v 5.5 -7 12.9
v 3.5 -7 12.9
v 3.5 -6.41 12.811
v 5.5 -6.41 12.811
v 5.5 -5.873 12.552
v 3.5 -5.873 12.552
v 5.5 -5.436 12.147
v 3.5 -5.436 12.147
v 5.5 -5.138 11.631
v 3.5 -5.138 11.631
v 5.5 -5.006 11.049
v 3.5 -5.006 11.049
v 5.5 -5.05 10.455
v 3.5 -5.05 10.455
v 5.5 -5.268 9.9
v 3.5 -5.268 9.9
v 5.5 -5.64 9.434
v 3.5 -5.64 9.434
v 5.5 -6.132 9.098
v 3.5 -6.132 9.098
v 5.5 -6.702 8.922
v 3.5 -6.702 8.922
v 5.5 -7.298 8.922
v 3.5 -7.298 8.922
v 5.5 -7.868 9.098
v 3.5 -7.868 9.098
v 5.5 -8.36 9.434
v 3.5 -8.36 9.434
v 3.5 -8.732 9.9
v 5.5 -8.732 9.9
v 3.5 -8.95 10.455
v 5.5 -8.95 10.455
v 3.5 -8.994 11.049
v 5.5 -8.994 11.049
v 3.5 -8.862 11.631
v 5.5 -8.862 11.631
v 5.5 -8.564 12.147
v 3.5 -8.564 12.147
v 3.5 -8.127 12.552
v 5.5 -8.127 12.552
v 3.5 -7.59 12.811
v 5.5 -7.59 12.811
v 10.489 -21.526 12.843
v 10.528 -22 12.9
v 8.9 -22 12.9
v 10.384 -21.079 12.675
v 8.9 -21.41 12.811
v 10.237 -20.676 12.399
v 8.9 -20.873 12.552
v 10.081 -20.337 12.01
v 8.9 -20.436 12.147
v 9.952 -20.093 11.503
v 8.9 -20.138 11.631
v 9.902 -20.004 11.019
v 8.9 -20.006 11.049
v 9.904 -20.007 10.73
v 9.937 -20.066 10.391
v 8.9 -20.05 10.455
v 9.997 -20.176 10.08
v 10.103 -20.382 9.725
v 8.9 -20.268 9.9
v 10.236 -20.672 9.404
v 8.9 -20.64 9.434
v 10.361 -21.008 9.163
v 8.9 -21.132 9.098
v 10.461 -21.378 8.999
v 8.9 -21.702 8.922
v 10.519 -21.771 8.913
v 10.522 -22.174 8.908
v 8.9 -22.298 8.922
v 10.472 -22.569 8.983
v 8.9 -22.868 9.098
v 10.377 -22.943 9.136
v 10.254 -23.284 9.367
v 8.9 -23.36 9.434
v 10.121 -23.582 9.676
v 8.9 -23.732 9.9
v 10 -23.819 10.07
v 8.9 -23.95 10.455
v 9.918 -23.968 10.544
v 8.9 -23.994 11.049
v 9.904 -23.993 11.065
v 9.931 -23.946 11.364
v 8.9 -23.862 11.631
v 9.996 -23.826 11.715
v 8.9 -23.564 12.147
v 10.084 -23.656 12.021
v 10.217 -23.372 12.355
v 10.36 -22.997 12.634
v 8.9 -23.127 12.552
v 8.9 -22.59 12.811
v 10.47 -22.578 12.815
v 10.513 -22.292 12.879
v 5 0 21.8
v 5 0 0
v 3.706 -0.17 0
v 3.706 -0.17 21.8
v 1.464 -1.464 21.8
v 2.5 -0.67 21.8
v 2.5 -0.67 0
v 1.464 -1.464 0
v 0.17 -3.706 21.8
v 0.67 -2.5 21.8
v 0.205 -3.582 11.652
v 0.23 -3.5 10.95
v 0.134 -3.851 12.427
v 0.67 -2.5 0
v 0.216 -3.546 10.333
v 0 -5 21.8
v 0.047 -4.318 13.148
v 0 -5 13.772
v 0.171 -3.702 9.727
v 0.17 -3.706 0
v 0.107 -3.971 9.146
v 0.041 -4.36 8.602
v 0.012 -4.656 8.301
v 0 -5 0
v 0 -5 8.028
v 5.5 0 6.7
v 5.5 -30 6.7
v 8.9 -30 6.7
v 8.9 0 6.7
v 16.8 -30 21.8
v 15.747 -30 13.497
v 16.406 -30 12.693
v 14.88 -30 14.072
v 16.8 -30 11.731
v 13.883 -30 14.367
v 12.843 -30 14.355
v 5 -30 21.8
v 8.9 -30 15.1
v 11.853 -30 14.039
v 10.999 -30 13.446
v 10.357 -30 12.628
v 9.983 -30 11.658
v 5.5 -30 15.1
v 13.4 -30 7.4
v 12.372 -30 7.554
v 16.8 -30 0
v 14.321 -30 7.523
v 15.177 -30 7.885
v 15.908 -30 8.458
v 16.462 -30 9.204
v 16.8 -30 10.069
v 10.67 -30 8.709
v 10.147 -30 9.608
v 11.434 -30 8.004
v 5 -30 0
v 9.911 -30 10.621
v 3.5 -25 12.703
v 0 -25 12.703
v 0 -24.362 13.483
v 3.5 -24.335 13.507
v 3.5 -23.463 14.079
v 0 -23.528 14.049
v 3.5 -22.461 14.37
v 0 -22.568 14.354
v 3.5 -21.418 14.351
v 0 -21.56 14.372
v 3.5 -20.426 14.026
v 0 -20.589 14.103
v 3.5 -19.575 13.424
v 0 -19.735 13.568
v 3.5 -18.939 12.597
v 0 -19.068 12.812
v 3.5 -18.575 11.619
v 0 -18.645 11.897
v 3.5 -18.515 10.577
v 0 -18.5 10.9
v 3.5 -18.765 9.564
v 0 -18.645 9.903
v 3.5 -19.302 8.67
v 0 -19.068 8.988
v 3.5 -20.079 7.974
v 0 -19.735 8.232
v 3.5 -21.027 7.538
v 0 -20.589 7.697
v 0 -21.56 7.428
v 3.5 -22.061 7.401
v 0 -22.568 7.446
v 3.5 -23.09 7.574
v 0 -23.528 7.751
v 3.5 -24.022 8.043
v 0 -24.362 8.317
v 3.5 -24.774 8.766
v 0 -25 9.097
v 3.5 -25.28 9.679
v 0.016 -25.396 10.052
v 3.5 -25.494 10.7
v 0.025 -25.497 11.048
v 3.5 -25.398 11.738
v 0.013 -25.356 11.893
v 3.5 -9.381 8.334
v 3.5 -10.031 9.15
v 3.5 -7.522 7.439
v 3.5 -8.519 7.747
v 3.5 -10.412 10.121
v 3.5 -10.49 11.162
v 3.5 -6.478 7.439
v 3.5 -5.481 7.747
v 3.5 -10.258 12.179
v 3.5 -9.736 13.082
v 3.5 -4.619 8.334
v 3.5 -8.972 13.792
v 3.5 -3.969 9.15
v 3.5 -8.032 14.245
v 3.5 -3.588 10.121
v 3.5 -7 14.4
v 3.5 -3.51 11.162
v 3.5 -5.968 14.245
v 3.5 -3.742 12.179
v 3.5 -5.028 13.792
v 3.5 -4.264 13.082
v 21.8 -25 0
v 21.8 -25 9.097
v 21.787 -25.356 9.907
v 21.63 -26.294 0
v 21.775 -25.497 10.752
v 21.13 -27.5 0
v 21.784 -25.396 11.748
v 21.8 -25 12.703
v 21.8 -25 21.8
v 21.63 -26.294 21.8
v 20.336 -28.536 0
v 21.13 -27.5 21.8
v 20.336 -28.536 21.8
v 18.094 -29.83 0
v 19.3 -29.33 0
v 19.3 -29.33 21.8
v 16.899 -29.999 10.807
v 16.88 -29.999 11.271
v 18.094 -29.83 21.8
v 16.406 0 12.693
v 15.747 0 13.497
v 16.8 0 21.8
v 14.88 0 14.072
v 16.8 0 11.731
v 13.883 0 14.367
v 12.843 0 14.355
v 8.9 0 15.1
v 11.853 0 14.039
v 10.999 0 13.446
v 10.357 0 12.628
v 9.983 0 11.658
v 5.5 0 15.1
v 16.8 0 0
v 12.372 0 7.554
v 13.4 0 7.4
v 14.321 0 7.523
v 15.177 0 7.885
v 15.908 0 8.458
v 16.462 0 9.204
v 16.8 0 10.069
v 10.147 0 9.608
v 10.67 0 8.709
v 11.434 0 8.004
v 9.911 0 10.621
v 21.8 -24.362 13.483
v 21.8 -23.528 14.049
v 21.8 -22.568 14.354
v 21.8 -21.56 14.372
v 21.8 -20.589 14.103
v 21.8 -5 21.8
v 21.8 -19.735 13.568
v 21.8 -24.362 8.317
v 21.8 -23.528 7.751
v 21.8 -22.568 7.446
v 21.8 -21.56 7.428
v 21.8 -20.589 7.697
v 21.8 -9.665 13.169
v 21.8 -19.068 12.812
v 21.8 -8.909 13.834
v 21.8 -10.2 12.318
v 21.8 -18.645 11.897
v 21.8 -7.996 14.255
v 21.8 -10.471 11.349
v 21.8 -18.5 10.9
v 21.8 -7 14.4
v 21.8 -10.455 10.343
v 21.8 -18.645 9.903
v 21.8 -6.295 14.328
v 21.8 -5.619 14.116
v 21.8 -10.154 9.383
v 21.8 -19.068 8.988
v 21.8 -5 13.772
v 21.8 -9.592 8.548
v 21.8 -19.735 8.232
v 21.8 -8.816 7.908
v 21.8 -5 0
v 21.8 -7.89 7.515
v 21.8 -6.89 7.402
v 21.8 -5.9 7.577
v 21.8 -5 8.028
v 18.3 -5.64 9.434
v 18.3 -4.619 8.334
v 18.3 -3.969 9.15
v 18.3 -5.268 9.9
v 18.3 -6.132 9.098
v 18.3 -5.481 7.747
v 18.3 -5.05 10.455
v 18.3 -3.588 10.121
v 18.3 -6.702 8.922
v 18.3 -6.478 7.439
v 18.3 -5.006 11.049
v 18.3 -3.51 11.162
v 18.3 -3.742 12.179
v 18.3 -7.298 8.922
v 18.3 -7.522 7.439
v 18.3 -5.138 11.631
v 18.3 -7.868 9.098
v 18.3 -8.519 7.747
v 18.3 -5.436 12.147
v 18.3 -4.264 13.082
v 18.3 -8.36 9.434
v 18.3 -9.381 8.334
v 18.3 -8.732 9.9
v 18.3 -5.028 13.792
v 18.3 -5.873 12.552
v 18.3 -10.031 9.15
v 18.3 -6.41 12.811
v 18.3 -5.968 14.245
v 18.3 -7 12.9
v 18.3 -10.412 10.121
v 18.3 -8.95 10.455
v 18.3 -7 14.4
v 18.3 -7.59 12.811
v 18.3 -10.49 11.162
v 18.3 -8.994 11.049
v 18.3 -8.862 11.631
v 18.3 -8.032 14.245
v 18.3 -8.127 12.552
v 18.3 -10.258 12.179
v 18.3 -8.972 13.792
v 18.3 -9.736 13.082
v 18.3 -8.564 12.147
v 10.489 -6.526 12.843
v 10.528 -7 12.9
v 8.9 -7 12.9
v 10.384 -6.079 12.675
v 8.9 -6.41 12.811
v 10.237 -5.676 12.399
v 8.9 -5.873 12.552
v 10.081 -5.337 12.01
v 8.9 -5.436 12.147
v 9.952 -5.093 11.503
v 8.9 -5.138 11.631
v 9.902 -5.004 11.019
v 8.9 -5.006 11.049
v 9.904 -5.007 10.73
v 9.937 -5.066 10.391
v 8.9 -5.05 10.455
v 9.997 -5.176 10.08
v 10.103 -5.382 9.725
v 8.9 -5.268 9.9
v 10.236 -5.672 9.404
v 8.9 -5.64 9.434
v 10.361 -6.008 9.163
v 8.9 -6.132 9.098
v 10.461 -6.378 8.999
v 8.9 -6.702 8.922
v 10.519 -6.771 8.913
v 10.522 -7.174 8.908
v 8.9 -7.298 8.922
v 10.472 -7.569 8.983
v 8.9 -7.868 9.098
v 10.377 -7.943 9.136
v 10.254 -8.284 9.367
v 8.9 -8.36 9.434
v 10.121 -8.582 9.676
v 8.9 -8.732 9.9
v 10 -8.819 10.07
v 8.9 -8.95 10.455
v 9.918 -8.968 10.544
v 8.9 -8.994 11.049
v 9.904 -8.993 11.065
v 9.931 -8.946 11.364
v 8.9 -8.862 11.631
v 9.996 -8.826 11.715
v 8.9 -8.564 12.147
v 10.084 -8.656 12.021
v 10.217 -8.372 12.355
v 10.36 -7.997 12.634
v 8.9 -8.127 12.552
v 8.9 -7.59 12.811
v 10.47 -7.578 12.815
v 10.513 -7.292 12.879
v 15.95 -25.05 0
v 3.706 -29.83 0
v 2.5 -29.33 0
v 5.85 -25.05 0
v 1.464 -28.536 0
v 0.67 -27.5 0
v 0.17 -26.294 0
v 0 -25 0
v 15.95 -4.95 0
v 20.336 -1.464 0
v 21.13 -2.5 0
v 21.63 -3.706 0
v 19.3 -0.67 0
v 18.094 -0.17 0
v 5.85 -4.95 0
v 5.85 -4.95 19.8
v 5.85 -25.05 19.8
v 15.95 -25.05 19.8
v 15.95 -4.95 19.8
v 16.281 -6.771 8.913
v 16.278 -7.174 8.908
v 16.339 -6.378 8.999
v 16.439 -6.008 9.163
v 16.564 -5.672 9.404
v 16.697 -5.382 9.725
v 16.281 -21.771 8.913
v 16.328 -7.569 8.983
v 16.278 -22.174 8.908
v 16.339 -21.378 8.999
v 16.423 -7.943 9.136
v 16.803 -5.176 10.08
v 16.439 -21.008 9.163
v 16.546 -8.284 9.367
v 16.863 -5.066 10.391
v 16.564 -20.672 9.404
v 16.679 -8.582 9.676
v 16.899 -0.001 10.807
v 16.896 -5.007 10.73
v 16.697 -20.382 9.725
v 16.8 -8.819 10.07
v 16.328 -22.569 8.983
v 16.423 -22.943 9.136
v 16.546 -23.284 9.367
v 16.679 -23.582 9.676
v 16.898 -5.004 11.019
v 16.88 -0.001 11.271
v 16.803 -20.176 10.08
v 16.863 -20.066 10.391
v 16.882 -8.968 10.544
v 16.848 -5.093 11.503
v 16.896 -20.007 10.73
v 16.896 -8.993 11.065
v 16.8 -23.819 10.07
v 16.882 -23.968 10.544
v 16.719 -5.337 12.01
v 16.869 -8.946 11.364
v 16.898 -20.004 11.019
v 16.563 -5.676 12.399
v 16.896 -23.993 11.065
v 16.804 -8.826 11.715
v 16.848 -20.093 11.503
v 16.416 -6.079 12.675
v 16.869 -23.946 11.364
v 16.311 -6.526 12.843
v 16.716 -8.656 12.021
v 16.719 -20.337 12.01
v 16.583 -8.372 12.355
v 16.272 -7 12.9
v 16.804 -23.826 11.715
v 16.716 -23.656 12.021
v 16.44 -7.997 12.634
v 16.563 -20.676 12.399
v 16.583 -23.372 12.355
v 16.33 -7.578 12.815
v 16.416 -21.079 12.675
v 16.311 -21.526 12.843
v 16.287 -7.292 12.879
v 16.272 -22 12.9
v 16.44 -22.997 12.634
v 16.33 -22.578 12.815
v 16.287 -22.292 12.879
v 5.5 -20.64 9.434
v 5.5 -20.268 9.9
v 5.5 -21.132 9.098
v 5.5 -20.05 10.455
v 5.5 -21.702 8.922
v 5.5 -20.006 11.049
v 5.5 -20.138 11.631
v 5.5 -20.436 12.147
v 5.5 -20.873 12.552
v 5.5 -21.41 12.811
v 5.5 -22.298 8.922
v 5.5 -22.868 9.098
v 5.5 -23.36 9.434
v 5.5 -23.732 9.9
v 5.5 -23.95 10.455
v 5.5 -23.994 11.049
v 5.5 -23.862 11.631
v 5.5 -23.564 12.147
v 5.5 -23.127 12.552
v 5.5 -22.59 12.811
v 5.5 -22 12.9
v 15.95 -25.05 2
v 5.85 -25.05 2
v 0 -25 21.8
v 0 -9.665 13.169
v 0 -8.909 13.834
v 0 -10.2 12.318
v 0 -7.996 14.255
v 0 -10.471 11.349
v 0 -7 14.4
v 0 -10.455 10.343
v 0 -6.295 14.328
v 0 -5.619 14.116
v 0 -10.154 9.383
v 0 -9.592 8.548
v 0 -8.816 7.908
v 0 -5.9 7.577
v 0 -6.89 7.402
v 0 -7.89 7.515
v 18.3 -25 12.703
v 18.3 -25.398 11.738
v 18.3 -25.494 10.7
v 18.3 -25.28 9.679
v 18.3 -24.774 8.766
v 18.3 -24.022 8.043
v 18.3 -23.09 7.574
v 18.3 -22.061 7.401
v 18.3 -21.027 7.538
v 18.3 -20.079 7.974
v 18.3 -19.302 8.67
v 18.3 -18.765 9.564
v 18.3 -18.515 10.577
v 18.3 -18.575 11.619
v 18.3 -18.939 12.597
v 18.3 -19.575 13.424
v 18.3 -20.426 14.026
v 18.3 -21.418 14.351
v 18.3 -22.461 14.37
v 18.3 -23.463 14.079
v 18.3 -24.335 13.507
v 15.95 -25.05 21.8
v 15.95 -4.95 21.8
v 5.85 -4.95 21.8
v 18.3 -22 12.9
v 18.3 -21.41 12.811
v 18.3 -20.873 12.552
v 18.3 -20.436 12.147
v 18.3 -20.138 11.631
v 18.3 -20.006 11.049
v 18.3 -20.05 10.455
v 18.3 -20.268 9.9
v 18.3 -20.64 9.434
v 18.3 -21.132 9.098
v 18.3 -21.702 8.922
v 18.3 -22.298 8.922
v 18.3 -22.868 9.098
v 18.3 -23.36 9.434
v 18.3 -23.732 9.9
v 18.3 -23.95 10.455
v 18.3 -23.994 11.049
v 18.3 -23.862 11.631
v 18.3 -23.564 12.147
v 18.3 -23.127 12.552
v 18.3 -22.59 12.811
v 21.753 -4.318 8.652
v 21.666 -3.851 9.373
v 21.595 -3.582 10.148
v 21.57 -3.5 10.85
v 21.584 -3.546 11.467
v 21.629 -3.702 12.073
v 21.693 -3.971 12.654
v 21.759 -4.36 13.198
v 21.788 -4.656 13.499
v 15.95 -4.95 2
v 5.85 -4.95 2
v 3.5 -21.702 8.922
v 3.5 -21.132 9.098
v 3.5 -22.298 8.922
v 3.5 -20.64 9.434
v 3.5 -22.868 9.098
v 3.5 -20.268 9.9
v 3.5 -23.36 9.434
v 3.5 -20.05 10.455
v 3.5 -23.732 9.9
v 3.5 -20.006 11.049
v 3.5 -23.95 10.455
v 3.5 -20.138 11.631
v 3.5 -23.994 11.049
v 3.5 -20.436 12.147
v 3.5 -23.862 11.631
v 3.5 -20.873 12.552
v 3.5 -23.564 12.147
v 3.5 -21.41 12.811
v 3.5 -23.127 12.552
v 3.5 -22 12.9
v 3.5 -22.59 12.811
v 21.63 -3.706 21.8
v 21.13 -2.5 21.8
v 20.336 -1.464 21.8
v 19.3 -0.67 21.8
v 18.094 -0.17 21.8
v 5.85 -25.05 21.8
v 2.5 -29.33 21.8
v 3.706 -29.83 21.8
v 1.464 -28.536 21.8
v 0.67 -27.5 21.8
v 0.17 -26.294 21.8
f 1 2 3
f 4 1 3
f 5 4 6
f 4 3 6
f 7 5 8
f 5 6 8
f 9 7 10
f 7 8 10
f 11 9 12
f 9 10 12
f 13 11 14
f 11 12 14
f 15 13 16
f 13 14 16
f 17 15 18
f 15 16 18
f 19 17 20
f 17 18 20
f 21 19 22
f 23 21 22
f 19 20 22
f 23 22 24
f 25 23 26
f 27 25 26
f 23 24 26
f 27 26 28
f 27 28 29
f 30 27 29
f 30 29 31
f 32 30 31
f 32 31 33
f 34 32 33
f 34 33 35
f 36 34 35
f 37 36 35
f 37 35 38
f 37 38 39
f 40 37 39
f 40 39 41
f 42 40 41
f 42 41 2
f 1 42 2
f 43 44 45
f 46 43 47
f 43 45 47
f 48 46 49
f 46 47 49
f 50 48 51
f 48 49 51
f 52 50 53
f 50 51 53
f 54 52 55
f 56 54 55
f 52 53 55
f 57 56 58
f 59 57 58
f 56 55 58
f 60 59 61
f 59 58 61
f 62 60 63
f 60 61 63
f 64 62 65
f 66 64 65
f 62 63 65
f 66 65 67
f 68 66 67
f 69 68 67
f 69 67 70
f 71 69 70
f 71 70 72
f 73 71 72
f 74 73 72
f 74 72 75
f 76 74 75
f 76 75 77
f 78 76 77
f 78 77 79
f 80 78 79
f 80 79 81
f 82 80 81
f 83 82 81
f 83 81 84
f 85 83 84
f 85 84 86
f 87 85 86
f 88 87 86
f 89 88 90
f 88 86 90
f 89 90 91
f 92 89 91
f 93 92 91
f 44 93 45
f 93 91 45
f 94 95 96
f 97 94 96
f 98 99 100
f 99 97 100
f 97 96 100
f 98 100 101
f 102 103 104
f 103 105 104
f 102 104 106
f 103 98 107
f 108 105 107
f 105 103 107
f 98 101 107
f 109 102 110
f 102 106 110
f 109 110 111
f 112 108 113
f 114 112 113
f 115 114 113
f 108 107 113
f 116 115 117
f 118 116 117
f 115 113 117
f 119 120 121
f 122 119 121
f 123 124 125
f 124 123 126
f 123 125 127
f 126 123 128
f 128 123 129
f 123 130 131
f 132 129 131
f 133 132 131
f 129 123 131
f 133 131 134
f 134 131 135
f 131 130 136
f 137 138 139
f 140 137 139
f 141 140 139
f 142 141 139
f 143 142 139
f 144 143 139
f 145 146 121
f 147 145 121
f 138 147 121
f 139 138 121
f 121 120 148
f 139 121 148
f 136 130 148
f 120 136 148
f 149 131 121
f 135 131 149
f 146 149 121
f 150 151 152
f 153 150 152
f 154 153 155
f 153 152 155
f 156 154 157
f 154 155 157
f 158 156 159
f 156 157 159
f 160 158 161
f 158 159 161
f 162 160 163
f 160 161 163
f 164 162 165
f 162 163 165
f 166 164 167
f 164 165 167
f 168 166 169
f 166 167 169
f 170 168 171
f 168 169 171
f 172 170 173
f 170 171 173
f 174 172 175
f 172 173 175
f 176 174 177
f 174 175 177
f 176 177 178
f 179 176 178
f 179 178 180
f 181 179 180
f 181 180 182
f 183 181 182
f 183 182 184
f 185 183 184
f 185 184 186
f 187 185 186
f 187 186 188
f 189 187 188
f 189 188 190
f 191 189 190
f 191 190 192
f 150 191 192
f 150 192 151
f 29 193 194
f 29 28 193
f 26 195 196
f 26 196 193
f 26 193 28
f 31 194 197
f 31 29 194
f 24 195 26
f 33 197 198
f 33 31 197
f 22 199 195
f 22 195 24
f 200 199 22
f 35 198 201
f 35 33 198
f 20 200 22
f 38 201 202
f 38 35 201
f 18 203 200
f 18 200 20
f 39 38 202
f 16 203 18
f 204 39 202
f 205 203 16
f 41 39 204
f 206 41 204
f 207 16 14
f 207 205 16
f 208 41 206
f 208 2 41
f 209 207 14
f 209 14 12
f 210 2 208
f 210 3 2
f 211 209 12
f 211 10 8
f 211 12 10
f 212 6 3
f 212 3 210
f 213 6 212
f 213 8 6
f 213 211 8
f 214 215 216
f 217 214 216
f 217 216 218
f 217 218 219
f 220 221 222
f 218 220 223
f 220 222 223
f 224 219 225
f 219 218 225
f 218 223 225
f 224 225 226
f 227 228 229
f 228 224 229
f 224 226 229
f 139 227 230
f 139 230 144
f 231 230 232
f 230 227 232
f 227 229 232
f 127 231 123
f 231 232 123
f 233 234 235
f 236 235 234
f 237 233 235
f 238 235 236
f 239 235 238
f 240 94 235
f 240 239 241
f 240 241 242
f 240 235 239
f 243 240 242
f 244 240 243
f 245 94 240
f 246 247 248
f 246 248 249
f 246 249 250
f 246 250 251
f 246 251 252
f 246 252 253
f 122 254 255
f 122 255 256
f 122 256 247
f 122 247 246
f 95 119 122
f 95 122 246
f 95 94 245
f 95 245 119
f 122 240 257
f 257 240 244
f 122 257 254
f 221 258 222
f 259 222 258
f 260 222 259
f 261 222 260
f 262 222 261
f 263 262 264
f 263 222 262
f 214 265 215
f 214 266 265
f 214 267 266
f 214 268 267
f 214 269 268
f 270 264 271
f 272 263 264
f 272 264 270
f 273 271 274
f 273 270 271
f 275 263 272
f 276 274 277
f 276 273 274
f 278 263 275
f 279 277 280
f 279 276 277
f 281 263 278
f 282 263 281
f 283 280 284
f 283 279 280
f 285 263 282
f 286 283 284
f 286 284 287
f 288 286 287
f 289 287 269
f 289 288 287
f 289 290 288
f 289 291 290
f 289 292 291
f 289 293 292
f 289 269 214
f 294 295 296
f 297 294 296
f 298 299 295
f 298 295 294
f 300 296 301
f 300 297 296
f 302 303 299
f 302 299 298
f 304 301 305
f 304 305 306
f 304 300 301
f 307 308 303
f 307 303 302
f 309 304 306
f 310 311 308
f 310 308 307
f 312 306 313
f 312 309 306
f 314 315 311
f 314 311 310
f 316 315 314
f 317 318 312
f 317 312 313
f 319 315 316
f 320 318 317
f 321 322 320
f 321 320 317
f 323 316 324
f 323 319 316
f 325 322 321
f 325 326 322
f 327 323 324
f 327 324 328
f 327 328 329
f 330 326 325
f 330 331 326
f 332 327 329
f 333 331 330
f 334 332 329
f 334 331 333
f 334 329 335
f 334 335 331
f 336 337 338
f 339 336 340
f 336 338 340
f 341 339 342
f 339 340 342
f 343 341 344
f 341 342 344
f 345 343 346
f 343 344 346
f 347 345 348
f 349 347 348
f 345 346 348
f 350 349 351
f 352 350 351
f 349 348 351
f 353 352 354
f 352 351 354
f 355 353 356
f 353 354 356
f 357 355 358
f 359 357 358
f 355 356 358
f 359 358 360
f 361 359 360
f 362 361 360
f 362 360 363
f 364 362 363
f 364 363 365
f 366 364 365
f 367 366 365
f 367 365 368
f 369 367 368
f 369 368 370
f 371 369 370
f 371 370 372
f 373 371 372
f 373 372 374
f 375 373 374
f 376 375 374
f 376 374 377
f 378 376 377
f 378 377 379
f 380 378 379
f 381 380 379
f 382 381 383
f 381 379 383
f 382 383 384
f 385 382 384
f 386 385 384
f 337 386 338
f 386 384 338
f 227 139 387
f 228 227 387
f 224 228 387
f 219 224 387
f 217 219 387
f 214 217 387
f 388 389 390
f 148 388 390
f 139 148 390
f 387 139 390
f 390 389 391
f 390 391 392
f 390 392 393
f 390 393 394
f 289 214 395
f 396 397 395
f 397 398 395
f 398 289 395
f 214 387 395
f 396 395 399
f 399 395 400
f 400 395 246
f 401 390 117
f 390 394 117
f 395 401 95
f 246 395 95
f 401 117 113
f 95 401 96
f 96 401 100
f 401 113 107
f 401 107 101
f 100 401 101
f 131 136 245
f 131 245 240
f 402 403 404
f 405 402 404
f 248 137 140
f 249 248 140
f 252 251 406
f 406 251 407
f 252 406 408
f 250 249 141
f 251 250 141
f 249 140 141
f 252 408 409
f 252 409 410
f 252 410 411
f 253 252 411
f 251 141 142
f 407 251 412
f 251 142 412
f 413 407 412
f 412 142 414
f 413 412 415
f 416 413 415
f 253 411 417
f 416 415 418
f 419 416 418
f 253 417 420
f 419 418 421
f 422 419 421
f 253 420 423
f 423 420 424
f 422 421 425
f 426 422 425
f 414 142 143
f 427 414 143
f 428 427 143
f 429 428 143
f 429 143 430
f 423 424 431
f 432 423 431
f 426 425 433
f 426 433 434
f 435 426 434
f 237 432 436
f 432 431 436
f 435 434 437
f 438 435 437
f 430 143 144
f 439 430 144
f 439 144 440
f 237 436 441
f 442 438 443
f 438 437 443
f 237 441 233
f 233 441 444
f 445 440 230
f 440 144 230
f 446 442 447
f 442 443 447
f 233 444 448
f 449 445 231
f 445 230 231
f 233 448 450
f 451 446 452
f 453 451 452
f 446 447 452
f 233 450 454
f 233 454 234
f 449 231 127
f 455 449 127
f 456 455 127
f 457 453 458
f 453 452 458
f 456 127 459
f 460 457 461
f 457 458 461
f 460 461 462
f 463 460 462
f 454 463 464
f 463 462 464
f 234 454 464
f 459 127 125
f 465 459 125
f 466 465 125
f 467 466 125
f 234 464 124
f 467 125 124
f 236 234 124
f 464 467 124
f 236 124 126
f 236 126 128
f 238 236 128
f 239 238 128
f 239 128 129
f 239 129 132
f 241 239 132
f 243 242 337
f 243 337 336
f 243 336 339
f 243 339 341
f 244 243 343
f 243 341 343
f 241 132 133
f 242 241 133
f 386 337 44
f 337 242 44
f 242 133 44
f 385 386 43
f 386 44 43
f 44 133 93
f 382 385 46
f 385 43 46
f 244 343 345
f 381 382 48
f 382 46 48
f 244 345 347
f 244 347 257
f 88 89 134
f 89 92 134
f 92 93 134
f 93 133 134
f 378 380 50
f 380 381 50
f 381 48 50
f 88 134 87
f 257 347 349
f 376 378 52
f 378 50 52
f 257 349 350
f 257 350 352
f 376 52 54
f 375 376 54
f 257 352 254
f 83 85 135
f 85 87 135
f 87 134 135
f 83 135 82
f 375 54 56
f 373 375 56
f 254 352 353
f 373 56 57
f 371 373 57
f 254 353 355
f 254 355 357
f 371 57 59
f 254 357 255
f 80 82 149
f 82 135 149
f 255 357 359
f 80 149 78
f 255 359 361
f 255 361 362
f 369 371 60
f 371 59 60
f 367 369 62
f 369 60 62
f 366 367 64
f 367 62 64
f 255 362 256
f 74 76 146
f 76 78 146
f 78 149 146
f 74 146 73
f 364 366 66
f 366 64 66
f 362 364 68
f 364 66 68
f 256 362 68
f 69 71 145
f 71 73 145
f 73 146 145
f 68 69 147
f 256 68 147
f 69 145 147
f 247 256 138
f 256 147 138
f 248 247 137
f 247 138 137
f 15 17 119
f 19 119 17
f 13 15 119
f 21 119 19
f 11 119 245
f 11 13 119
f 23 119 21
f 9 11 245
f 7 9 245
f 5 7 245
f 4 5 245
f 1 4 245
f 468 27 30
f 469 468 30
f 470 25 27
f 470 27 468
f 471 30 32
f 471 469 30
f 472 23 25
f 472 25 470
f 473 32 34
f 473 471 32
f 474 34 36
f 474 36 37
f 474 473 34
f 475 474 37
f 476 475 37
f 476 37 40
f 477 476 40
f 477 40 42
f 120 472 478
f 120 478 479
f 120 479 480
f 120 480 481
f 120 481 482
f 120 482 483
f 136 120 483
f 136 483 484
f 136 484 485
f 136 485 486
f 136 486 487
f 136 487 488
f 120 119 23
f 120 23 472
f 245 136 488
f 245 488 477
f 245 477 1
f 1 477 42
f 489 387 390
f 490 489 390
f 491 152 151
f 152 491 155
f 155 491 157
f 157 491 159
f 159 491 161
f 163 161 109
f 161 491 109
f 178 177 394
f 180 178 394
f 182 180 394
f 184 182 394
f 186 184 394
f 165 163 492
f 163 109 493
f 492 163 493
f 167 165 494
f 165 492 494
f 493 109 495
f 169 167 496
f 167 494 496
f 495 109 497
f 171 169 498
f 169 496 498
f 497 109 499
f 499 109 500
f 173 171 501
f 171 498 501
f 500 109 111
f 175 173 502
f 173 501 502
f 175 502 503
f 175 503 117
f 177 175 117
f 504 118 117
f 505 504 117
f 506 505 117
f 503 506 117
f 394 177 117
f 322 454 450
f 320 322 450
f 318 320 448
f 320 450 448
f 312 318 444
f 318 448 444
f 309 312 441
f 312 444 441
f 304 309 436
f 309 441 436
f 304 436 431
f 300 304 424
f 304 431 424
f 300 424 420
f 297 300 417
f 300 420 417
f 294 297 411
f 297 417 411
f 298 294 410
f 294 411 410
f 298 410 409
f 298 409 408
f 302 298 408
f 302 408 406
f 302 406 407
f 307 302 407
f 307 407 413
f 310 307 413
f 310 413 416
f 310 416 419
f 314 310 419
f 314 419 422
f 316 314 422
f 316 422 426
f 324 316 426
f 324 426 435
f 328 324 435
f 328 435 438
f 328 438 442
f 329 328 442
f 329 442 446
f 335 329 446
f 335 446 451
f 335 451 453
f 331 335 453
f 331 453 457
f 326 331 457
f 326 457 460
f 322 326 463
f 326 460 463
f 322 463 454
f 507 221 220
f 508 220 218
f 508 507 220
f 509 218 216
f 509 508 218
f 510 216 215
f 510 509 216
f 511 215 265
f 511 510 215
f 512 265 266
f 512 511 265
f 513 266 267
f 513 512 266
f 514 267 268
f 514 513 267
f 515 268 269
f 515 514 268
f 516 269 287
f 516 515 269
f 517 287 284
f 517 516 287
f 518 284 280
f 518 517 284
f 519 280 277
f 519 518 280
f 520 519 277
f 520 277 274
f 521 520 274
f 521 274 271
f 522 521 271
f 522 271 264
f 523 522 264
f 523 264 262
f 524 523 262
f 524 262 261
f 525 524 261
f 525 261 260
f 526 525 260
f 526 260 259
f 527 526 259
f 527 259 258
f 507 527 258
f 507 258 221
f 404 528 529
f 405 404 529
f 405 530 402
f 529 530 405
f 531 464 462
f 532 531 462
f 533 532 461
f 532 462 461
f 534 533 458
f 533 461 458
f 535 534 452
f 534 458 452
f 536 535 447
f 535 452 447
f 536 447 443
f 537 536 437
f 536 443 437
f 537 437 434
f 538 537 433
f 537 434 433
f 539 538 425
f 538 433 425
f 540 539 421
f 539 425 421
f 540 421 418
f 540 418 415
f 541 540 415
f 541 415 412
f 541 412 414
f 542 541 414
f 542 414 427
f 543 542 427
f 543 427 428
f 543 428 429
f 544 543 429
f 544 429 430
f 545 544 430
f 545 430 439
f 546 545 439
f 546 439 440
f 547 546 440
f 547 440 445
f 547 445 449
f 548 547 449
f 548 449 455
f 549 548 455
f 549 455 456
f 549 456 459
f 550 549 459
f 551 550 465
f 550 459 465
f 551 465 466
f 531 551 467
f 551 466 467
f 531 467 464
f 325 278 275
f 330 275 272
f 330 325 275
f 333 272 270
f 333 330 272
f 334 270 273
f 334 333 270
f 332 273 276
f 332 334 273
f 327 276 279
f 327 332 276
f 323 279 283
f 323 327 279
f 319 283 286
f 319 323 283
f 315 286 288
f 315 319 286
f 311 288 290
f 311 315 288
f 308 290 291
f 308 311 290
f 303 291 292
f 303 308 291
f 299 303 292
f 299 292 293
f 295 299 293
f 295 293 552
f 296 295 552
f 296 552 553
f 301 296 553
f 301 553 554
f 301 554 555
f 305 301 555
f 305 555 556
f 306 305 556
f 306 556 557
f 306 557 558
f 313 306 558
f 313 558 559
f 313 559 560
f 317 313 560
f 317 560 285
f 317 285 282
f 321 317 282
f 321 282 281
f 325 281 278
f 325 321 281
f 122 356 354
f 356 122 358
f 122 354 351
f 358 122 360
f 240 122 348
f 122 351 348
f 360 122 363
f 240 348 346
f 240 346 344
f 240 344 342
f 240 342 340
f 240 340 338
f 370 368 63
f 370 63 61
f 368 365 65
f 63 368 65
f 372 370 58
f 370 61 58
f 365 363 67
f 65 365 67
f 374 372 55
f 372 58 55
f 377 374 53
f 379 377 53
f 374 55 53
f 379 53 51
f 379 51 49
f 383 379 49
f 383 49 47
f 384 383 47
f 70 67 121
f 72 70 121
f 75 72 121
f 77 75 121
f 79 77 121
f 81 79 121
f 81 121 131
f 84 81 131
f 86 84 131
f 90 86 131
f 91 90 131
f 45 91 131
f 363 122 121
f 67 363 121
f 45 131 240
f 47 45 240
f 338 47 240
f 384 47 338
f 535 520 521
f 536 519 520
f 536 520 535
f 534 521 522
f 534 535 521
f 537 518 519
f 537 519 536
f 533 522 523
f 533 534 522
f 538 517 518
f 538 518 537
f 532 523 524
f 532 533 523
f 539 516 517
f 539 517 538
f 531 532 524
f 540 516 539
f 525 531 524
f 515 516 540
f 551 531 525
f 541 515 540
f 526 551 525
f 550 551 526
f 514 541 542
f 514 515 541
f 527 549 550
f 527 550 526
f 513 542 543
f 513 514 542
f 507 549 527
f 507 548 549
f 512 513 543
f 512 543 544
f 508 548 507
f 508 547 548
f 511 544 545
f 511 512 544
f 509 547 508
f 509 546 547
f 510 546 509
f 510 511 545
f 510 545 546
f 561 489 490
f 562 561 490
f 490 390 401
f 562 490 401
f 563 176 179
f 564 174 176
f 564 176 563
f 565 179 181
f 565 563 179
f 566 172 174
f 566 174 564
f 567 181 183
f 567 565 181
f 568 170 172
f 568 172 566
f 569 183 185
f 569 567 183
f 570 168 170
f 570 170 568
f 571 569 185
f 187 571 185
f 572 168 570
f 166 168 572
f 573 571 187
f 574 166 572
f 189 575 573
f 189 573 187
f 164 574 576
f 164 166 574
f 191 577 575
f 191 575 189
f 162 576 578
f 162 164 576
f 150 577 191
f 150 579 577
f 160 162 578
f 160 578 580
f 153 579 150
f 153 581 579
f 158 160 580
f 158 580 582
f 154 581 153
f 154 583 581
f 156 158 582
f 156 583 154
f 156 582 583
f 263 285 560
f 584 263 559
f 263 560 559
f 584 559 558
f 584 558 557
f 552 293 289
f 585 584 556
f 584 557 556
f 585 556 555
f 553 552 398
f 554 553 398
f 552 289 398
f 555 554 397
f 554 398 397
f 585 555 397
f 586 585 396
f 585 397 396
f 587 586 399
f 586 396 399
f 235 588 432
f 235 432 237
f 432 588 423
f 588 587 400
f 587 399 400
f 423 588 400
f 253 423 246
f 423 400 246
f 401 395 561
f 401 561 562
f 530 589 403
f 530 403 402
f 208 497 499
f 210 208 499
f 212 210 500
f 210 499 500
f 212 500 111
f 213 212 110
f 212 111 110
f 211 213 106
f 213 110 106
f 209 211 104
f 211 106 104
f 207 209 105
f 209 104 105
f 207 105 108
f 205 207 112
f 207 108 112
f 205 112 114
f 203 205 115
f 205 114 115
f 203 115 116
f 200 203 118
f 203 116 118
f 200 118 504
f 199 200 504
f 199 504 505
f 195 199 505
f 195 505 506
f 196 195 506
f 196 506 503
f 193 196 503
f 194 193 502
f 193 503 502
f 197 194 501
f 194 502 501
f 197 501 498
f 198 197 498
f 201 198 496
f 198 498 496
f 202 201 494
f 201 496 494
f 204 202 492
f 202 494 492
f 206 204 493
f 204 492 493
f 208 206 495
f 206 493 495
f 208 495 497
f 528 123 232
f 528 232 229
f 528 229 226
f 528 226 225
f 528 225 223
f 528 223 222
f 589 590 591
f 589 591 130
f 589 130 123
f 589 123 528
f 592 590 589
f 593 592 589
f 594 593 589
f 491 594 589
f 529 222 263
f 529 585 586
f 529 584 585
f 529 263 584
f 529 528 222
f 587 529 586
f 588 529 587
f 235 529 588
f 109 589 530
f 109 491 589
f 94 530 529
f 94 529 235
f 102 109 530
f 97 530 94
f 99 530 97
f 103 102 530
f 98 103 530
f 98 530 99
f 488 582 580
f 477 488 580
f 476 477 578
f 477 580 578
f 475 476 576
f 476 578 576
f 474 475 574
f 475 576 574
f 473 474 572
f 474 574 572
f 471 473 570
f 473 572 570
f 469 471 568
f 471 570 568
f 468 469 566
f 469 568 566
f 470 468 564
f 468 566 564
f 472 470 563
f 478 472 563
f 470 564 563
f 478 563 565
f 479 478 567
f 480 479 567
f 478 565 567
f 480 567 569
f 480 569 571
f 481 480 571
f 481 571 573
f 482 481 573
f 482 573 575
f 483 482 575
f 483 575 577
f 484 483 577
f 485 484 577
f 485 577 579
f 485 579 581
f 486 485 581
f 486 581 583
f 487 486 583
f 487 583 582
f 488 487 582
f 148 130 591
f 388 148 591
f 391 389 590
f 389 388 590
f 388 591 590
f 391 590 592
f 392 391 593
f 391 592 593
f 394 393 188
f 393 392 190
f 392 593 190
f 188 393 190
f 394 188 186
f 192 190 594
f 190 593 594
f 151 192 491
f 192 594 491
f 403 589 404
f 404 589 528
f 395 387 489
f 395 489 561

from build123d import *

# Parameters (mm, degrees)
CROQUIS1_W                        = 21.8
CROQUIS1_H                        = 30
SALIENTE_EXTRUIR1_DEPTH           = 21.8
CROQUIS6_R                        = 2
CORTAR_EXTRUIR2_DEPTH             = 21.8
CORTAR_EXTRUIR4_REACH             = 45.017
CROQUIS11_R                       = 3.5
CROQUIS11_W                       = 3.4
CROQUIS11_H                       = 8.4
CORTAR_EXTRUIR4_DIRECTION_2_DEPTH = 3.5
REDONDEO1_R                       = 5
CROQUIS13_R                       = 3.5
CORTAR_EXTRUIR6_DEPTH             = 3.5
CROQUIS16_W                       = 10.1
CROQUIS16_H                       = 20.1
CORTAR_EXTRUIR7_DEPTH             = 2
CROQUIS17_W                       = 10.1
CROQUIS17_H                       = 20.1
CORTAR_EXTRUIR8_DEPTH             = 2
CORTAR_EXTRUIR9_START             = -3.5
CROQUIS7_R                        = 3.5
CORTAR_EXTRUIR9_DEPTH             = 3.5


with BuildPart() as part:
    # Croquis1 → Saliente-Extruir1 (new body)
    with BuildSketch(Plane(origin=(0, 0, 0), x_dir=(0, 0, -1), z_dir=(1, 0, 0))):
        with Locations((-10.9, -15)):
            Rectangle(CROQUIS1_W, CROQUIS1_H)
    extrude(amount=SALIENTE_EXTRUIR1_DEPTH)

    # Croquis6 → Cortar-Extruir2 (cut)
    with BuildSketch(Plane.ZY):
        with Locations((10.9, -22)):
            Circle(CROQUIS6_R)
        with Locations((10.9, -7)):
            Circle(CROQUIS6_R)
    extrude(amount=-CORTAR_EXTRUIR2_DEPTH, mode=Mode.SUBTRACT)

    # Cortar-Extruir4: up to this face of the body (flat: up to its plane)
    cortar_extruir4_end = Plane(part.part.faces().sort_by_distance((10.9, 0, 10.9))[0])
    # Croquis11 → Cortar-Extruir4 (cut, up to the picked face)
    with BuildSketch(Plane.XZ.offset(30), mode=Mode.PRIVATE) as cortar_extruir4_sk1:
        with Locations(Location((13.4, 10.9, 0), (0, 0, 270))):
            Circle(CROQUIS11_R)
    cortar_extruir4_tool1 = split(extrude(cortar_extruir4_sk1.sketch, amount=-CORTAR_EXTRUIR4_REACH, mode=Mode.PRIVATE), bisect_by=cortar_extruir4_end, keep=Keep.BOTH, mode=Mode.PRIVATE)
    # Croquis11 → Cortar-Extruir4 (cut, up to the picked face)
    with BuildSketch(Plane.XZ.offset(30), mode=Mode.PRIVATE) as cortar_extruir4_sk2:
        with Locations((7.2, 10.9)):
            Rectangle(CROQUIS11_W, CROQUIS11_H)
    cortar_extruir4_tool2 = split(extrude(cortar_extruir4_sk2.sketch, amount=-CORTAR_EXTRUIR4_REACH, mode=Mode.PRIVATE), bisect_by=cortar_extruir4_end, keep=Keep.BOTH, mode=Mode.PRIVATE)
    add(cortar_extruir4_tool1.solids().sort_by(Axis((13.4, -30, 10.9), (0, 1, 0)))[0], mode=Mode.SUBTRACT)
    add(cortar_extruir4_tool2.solids().sort_by(Axis((7.2, -30, 10.9), (0, 1, 0)))[0], mode=Mode.SUBTRACT)

    # Croquis11 → Cortar-Extruir4 direction 2 (cut)
    with BuildSketch(Plane.XZ.offset(30)):
        with Locations(Location((13.4, 10.9, 0), (0, 0, 270))):
            Circle(CROQUIS11_R)
        with Locations((7.2, 10.9)):
            Rectangle(CROQUIS11_W, CROQUIS11_H)
    extrude(amount=CORTAR_EXTRUIR4_DIRECTION_2_DEPTH, mode=Mode.SUBTRACT)

    # Redondeo1
    # the kernel refuses this fillet: 5 mm, written as the material it takes off along each edge
    with BuildSketch(Plane(origin=(21.8, -30, 34.3), x_dir=(0, 1, 0), z_dir=(0, 0, -1)), Plane(origin=(0, 0, -12.5), x_dir=(1, 0, 0), z_dir=(0, 0, 1))) as redondeo1_piece_1:
        with BuildLine():
            CenterArc((REDONDEO1_R, -REDONDEO1_R), REDONDEO1_R, 90, 90)
            Line((0, -REDONDEO1_R), (0, 0))
            Line((0, 0), (REDONDEO1_R, 0))
        make_face()
    extrude(amount=46.8, mode=Mode.SUBTRACT)
    with BuildSketch(Plane(origin=(21.8, 0, -12.5), x_dir=(-1, 0, 0), z_dir=(0, 0, 1)), Plane(origin=(0, -30, 34.3), x_dir=(0, 1, 0), z_dir=(0, 0, -1))) as redondeo1_piece_2:
        with BuildLine():
            CenterArc((REDONDEO1_R, REDONDEO1_R), REDONDEO1_R, 180, 90)
            Line((0, REDONDEO1_R), (0, 0))
            Line((0, 0), (REDONDEO1_R, 0))
        make_face()
    extrude(amount=46.8, mode=Mode.SUBTRACT)

    # Croquis13 → Cortar-Extruir6 (cut)
    with BuildSketch(Plane.ZY):
        with Locations((10.9, -7)):
            Circle(CROQUIS13_R)
        with Locations(Location((10.9, -22, 0), (0, 0, 301.002719134))):
            Circle(CROQUIS13_R)
    extrude(amount=-CORTAR_EXTRUIR6_DEPTH, mode=Mode.SUBTRACT)

    # Croquis16 → Cortar-Extruir7 (cut)
    with BuildSketch(Plane.XY.offset(21.8)):
        with Locations((10.9, -15)):
            Rectangle(CROQUIS16_W, CROQUIS16_H)
    extrude(amount=-CORTAR_EXTRUIR7_DEPTH, mode=Mode.SUBTRACT)

    # Croquis17 → Cortar-Extruir8 (cut)
    with BuildSketch(Plane(origin=(0, 0, 0), x_dir=(-1, 0, 0), z_dir=(0, 0, -1))):
        with Locations((-10.9, -15)):
            Rectangle(CROQUIS17_W, CROQUIS17_H)
    extrude(amount=-CORTAR_EXTRUIR8_DEPTH, mode=Mode.SUBTRACT)

    # Croquis7 → Cortar-Extruir9 (cut)
    with BuildSketch(Plane(origin=(21.8, 0, 0), x_dir=(0, 0, -1), z_dir=(1, 0, 0)).offset(CORTAR_EXTRUIR9_START)):
        with Locations(Location((-10.9, -22, 0), (0, 0, 238.997280866))):
            Circle(CROQUIS7_R)
        with Locations(Location((-10.9, -7, 0), (0, 0, 180))):
            Circle(CROQUIS7_R)
    extrude(amount=CORTAR_EXTRUIR9_DEPTH, mode=Mode.SUBTRACT)


solid = part.part
